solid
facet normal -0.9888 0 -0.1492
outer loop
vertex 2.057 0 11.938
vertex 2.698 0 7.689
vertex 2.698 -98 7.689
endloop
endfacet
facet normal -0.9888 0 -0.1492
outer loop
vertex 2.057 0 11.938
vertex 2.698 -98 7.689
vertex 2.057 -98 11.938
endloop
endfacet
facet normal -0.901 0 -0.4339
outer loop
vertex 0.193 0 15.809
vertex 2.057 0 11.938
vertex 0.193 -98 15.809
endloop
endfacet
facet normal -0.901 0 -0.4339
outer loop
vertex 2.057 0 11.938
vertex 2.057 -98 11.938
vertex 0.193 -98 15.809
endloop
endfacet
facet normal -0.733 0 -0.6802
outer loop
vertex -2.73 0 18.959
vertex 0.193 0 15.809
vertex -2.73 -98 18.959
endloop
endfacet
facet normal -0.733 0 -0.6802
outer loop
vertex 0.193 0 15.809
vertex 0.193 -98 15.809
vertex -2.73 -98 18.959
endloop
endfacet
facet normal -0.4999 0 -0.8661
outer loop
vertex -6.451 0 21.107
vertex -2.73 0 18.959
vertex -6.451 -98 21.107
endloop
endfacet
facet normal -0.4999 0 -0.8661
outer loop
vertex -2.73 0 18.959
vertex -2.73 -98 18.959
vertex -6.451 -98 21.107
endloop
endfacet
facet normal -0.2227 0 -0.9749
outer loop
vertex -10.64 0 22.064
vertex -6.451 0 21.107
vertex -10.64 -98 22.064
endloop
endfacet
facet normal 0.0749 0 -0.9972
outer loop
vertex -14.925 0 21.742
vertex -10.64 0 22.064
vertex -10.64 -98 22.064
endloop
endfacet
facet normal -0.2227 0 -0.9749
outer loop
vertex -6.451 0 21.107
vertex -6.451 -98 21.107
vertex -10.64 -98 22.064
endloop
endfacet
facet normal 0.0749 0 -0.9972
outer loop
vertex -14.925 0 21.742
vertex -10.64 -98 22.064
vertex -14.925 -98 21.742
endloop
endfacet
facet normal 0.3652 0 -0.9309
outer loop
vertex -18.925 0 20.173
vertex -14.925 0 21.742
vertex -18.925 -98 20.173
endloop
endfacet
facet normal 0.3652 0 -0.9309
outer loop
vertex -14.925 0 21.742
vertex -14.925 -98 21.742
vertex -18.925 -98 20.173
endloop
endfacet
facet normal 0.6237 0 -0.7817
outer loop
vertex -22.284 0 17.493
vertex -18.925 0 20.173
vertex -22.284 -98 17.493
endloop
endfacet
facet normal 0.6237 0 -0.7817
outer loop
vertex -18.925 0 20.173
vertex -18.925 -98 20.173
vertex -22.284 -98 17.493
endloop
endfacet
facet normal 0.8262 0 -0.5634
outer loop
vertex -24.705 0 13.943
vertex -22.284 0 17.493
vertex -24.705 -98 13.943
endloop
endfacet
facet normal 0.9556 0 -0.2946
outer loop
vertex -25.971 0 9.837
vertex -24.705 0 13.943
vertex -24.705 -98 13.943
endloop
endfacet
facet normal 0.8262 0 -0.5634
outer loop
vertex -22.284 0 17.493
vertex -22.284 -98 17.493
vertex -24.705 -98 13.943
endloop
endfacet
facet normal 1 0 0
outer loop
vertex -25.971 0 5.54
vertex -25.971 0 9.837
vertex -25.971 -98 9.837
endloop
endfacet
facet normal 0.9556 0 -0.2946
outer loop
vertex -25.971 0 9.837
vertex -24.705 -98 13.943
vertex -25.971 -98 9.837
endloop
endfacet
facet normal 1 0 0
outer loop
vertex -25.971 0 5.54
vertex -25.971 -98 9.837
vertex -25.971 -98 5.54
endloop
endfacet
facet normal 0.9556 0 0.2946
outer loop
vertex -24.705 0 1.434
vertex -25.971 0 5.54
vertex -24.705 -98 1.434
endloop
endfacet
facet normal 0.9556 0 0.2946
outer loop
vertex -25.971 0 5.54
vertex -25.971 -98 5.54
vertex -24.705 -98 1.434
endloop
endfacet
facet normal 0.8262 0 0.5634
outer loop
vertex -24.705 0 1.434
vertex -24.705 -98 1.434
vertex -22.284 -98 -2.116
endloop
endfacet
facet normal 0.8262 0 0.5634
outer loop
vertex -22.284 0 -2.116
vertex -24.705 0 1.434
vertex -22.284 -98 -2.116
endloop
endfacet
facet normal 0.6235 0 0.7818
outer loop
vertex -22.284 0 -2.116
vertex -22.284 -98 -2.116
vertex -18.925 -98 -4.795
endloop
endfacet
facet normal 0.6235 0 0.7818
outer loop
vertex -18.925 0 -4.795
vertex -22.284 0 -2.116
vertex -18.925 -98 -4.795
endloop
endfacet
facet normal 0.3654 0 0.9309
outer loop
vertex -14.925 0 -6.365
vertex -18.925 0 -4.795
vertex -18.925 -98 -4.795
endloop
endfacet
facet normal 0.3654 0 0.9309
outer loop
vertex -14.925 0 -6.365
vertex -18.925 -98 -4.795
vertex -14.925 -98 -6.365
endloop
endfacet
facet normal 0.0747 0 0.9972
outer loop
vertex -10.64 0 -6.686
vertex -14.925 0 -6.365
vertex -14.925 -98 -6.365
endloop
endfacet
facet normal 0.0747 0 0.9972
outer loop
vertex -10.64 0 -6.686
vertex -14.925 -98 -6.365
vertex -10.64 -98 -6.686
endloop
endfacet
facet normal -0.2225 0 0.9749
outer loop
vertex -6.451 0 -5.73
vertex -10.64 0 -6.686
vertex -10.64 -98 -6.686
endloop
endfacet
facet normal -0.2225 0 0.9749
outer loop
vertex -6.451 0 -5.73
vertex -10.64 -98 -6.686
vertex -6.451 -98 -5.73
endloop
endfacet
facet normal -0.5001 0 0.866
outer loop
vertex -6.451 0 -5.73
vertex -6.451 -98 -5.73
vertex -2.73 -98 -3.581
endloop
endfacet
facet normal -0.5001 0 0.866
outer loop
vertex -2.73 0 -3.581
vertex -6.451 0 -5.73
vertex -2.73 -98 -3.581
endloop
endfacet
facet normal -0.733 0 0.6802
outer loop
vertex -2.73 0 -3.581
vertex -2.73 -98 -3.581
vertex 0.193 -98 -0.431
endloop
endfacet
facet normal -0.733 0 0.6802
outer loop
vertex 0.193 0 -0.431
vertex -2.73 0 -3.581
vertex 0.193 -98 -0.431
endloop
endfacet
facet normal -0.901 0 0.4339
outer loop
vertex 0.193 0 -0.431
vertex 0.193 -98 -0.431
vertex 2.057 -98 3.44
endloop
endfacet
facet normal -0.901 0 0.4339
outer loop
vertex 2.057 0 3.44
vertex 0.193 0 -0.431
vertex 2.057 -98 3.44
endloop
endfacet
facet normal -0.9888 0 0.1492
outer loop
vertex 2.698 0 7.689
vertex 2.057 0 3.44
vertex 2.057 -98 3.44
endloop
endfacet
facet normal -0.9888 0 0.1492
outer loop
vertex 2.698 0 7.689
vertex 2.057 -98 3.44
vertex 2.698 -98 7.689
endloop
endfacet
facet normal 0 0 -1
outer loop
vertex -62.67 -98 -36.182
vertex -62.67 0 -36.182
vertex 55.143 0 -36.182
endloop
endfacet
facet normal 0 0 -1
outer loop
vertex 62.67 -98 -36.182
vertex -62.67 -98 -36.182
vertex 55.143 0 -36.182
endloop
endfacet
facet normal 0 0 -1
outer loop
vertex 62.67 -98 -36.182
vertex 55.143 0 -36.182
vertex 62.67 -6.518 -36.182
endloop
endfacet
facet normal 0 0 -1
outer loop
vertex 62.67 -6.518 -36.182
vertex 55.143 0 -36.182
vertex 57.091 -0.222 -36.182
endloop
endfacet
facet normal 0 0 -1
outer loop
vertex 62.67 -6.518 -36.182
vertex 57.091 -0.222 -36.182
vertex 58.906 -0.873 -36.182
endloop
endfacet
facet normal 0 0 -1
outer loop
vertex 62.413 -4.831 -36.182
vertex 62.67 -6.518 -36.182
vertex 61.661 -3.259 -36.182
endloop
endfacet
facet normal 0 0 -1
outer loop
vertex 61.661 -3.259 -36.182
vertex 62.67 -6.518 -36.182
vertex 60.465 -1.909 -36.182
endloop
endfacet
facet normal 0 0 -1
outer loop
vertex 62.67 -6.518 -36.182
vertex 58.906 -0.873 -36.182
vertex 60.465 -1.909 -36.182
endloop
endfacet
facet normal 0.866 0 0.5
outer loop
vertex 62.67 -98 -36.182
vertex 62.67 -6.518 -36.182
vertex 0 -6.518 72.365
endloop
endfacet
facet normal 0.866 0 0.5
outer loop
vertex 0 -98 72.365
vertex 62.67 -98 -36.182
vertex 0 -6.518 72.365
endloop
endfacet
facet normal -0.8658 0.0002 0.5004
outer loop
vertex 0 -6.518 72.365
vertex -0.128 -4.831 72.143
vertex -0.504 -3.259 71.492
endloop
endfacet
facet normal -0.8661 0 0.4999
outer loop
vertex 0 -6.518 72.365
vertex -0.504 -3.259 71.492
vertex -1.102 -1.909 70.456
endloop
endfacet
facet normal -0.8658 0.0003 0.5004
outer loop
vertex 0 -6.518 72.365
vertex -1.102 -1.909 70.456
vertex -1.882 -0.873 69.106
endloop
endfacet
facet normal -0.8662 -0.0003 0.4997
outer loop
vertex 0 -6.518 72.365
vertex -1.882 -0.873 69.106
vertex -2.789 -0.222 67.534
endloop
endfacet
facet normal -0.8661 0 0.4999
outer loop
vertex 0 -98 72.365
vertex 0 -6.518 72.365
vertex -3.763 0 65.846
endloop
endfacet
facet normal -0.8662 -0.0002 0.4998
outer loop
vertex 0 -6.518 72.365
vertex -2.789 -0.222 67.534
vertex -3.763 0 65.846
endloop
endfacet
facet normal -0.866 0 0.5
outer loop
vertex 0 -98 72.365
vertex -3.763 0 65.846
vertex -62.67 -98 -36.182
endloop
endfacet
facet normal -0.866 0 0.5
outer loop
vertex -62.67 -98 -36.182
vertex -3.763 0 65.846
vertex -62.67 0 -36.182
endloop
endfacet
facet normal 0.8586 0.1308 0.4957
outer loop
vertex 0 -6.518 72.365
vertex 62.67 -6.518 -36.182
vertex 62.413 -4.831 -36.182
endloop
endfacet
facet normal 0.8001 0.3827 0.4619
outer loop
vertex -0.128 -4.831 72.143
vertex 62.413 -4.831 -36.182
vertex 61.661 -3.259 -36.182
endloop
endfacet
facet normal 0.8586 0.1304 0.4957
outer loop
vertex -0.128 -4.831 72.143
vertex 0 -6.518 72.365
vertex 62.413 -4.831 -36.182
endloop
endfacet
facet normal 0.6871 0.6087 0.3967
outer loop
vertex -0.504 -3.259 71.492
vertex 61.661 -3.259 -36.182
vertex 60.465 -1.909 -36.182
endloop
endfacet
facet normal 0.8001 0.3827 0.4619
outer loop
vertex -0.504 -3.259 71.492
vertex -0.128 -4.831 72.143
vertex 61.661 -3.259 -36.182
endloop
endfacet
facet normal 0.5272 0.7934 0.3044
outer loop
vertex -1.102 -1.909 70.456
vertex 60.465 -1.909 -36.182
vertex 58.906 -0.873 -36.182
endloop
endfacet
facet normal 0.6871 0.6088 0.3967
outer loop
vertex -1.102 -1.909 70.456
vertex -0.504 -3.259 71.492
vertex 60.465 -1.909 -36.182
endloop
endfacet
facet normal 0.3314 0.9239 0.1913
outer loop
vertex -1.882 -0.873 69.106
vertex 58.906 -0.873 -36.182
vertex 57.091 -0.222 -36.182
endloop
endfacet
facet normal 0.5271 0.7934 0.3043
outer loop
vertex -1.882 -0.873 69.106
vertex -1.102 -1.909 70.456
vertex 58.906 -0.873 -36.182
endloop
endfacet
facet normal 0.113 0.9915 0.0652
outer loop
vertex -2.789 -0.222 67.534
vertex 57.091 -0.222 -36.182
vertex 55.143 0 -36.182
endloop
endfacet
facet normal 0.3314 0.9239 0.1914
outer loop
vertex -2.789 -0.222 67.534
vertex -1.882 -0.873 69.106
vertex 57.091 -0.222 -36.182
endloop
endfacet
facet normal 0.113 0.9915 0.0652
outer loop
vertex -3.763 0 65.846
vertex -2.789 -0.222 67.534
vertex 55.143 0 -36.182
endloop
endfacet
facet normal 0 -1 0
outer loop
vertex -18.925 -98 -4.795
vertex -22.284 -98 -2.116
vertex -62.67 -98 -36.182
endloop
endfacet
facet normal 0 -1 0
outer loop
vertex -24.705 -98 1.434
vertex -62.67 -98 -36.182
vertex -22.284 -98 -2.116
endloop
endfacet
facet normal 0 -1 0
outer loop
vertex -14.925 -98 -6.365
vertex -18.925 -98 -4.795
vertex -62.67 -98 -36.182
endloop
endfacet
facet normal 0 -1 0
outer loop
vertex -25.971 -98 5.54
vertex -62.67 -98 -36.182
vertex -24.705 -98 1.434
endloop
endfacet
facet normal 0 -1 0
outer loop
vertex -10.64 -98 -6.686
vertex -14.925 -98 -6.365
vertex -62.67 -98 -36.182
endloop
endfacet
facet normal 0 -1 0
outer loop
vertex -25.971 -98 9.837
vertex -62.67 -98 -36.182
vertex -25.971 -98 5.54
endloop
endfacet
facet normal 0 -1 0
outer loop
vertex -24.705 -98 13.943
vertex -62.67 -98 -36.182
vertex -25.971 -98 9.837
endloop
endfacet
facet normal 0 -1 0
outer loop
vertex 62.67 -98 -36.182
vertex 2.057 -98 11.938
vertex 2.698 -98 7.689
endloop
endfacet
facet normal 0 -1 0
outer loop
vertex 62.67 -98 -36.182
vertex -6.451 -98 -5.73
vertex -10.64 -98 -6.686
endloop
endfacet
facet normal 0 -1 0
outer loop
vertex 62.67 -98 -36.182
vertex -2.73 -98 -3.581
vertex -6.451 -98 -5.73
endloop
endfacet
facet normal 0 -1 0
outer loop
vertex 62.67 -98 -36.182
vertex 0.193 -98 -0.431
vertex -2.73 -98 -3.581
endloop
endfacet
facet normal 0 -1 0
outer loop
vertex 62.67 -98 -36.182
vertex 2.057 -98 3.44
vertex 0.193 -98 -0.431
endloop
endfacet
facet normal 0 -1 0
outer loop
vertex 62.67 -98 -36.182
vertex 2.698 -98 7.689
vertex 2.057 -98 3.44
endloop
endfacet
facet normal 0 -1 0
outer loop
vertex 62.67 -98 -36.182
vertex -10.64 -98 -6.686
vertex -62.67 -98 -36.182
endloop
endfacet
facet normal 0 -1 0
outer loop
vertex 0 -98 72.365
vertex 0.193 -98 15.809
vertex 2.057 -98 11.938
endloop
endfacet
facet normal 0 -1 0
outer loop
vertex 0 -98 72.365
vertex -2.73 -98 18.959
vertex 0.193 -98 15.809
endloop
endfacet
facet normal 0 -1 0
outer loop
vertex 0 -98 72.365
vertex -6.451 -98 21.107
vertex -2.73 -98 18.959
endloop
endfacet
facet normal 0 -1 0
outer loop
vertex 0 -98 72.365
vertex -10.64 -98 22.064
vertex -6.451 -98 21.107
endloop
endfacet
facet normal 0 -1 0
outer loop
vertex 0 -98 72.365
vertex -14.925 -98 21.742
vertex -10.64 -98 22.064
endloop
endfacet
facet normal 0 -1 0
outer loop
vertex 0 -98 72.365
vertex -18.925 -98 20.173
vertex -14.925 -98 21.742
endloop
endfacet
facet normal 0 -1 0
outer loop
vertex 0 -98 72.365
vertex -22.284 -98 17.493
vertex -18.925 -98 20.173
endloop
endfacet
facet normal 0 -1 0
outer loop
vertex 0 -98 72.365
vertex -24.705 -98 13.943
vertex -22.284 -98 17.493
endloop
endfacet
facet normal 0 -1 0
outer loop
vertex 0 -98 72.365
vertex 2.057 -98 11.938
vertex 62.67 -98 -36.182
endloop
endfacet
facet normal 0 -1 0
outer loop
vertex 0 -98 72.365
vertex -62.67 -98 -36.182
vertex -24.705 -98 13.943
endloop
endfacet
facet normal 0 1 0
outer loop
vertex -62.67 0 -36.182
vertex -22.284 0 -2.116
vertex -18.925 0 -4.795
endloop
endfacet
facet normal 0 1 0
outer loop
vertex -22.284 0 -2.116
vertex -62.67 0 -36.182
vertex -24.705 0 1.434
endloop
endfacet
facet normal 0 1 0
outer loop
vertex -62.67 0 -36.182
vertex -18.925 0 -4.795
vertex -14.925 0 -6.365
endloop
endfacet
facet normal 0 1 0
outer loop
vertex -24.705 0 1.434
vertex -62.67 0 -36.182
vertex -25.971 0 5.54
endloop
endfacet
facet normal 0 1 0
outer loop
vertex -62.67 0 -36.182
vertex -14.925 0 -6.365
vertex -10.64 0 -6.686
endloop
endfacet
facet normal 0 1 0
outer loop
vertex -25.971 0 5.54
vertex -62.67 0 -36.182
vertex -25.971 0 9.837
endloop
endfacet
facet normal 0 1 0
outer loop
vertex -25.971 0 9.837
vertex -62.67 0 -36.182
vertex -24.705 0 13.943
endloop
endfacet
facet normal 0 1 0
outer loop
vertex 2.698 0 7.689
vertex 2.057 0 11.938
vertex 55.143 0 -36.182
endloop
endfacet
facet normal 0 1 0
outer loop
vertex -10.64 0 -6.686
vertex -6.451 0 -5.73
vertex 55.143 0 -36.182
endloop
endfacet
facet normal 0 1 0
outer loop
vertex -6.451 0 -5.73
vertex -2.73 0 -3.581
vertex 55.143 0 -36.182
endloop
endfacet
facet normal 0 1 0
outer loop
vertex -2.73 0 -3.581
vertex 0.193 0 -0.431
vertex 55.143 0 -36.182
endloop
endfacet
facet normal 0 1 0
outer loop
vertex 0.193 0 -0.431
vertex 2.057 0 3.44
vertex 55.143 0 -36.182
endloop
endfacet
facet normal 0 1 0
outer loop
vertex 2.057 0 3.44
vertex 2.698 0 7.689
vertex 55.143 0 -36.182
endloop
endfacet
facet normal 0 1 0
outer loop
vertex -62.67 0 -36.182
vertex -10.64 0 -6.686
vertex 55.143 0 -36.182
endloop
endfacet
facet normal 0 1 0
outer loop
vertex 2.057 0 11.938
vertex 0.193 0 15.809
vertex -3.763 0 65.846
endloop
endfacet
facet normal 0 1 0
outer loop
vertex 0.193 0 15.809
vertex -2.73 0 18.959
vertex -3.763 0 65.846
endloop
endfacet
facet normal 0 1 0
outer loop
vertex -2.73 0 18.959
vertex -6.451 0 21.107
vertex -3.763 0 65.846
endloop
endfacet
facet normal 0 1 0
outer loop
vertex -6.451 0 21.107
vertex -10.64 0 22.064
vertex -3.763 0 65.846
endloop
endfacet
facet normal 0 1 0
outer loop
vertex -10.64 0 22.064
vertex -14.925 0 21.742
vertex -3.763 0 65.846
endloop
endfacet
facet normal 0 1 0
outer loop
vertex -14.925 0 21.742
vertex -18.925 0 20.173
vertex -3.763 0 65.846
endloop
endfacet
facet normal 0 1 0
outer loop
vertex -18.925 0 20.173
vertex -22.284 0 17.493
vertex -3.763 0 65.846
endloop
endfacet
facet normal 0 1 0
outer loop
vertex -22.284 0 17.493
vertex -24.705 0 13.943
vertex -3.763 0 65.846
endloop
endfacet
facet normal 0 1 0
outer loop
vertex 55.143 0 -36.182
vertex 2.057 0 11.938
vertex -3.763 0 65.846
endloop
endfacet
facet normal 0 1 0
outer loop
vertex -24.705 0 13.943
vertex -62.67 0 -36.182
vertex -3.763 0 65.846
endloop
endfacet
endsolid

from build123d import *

# Parameters (mm, degrees)
F1_DEPTH = 98
F2_R     = 6.518377
F3_R     = 14.415035
F4_DEPTH = 98.001


with BuildPart() as f1:
    # F0 (on Front) → F1 (new body)
    with BuildSketch(Plane.XZ):
        Polygon((-62.669813, -36.182433), (62.669813, -36.182433), (0, 72.364867), align=None)
    extrude(amount=F1_DEPTH)

    # F2
    f2_edges = [f1.edges().sort_by_distance(p)[0] for p in [
        (31.334906, 0, 18.091217),
    ]]
    fillet(f2_edges, radius=F2_R)

    # F3 (on face) → F4 (cut, through all)
    with BuildSketch(Plane.XZ.offset(98)):
        with Locations((-11.717295, 7.68878)):
            Circle(F3_R)
    extrude(amount=-F4_DEPTH, mode=Mode.SUBTRACT)


solid = f1.part
